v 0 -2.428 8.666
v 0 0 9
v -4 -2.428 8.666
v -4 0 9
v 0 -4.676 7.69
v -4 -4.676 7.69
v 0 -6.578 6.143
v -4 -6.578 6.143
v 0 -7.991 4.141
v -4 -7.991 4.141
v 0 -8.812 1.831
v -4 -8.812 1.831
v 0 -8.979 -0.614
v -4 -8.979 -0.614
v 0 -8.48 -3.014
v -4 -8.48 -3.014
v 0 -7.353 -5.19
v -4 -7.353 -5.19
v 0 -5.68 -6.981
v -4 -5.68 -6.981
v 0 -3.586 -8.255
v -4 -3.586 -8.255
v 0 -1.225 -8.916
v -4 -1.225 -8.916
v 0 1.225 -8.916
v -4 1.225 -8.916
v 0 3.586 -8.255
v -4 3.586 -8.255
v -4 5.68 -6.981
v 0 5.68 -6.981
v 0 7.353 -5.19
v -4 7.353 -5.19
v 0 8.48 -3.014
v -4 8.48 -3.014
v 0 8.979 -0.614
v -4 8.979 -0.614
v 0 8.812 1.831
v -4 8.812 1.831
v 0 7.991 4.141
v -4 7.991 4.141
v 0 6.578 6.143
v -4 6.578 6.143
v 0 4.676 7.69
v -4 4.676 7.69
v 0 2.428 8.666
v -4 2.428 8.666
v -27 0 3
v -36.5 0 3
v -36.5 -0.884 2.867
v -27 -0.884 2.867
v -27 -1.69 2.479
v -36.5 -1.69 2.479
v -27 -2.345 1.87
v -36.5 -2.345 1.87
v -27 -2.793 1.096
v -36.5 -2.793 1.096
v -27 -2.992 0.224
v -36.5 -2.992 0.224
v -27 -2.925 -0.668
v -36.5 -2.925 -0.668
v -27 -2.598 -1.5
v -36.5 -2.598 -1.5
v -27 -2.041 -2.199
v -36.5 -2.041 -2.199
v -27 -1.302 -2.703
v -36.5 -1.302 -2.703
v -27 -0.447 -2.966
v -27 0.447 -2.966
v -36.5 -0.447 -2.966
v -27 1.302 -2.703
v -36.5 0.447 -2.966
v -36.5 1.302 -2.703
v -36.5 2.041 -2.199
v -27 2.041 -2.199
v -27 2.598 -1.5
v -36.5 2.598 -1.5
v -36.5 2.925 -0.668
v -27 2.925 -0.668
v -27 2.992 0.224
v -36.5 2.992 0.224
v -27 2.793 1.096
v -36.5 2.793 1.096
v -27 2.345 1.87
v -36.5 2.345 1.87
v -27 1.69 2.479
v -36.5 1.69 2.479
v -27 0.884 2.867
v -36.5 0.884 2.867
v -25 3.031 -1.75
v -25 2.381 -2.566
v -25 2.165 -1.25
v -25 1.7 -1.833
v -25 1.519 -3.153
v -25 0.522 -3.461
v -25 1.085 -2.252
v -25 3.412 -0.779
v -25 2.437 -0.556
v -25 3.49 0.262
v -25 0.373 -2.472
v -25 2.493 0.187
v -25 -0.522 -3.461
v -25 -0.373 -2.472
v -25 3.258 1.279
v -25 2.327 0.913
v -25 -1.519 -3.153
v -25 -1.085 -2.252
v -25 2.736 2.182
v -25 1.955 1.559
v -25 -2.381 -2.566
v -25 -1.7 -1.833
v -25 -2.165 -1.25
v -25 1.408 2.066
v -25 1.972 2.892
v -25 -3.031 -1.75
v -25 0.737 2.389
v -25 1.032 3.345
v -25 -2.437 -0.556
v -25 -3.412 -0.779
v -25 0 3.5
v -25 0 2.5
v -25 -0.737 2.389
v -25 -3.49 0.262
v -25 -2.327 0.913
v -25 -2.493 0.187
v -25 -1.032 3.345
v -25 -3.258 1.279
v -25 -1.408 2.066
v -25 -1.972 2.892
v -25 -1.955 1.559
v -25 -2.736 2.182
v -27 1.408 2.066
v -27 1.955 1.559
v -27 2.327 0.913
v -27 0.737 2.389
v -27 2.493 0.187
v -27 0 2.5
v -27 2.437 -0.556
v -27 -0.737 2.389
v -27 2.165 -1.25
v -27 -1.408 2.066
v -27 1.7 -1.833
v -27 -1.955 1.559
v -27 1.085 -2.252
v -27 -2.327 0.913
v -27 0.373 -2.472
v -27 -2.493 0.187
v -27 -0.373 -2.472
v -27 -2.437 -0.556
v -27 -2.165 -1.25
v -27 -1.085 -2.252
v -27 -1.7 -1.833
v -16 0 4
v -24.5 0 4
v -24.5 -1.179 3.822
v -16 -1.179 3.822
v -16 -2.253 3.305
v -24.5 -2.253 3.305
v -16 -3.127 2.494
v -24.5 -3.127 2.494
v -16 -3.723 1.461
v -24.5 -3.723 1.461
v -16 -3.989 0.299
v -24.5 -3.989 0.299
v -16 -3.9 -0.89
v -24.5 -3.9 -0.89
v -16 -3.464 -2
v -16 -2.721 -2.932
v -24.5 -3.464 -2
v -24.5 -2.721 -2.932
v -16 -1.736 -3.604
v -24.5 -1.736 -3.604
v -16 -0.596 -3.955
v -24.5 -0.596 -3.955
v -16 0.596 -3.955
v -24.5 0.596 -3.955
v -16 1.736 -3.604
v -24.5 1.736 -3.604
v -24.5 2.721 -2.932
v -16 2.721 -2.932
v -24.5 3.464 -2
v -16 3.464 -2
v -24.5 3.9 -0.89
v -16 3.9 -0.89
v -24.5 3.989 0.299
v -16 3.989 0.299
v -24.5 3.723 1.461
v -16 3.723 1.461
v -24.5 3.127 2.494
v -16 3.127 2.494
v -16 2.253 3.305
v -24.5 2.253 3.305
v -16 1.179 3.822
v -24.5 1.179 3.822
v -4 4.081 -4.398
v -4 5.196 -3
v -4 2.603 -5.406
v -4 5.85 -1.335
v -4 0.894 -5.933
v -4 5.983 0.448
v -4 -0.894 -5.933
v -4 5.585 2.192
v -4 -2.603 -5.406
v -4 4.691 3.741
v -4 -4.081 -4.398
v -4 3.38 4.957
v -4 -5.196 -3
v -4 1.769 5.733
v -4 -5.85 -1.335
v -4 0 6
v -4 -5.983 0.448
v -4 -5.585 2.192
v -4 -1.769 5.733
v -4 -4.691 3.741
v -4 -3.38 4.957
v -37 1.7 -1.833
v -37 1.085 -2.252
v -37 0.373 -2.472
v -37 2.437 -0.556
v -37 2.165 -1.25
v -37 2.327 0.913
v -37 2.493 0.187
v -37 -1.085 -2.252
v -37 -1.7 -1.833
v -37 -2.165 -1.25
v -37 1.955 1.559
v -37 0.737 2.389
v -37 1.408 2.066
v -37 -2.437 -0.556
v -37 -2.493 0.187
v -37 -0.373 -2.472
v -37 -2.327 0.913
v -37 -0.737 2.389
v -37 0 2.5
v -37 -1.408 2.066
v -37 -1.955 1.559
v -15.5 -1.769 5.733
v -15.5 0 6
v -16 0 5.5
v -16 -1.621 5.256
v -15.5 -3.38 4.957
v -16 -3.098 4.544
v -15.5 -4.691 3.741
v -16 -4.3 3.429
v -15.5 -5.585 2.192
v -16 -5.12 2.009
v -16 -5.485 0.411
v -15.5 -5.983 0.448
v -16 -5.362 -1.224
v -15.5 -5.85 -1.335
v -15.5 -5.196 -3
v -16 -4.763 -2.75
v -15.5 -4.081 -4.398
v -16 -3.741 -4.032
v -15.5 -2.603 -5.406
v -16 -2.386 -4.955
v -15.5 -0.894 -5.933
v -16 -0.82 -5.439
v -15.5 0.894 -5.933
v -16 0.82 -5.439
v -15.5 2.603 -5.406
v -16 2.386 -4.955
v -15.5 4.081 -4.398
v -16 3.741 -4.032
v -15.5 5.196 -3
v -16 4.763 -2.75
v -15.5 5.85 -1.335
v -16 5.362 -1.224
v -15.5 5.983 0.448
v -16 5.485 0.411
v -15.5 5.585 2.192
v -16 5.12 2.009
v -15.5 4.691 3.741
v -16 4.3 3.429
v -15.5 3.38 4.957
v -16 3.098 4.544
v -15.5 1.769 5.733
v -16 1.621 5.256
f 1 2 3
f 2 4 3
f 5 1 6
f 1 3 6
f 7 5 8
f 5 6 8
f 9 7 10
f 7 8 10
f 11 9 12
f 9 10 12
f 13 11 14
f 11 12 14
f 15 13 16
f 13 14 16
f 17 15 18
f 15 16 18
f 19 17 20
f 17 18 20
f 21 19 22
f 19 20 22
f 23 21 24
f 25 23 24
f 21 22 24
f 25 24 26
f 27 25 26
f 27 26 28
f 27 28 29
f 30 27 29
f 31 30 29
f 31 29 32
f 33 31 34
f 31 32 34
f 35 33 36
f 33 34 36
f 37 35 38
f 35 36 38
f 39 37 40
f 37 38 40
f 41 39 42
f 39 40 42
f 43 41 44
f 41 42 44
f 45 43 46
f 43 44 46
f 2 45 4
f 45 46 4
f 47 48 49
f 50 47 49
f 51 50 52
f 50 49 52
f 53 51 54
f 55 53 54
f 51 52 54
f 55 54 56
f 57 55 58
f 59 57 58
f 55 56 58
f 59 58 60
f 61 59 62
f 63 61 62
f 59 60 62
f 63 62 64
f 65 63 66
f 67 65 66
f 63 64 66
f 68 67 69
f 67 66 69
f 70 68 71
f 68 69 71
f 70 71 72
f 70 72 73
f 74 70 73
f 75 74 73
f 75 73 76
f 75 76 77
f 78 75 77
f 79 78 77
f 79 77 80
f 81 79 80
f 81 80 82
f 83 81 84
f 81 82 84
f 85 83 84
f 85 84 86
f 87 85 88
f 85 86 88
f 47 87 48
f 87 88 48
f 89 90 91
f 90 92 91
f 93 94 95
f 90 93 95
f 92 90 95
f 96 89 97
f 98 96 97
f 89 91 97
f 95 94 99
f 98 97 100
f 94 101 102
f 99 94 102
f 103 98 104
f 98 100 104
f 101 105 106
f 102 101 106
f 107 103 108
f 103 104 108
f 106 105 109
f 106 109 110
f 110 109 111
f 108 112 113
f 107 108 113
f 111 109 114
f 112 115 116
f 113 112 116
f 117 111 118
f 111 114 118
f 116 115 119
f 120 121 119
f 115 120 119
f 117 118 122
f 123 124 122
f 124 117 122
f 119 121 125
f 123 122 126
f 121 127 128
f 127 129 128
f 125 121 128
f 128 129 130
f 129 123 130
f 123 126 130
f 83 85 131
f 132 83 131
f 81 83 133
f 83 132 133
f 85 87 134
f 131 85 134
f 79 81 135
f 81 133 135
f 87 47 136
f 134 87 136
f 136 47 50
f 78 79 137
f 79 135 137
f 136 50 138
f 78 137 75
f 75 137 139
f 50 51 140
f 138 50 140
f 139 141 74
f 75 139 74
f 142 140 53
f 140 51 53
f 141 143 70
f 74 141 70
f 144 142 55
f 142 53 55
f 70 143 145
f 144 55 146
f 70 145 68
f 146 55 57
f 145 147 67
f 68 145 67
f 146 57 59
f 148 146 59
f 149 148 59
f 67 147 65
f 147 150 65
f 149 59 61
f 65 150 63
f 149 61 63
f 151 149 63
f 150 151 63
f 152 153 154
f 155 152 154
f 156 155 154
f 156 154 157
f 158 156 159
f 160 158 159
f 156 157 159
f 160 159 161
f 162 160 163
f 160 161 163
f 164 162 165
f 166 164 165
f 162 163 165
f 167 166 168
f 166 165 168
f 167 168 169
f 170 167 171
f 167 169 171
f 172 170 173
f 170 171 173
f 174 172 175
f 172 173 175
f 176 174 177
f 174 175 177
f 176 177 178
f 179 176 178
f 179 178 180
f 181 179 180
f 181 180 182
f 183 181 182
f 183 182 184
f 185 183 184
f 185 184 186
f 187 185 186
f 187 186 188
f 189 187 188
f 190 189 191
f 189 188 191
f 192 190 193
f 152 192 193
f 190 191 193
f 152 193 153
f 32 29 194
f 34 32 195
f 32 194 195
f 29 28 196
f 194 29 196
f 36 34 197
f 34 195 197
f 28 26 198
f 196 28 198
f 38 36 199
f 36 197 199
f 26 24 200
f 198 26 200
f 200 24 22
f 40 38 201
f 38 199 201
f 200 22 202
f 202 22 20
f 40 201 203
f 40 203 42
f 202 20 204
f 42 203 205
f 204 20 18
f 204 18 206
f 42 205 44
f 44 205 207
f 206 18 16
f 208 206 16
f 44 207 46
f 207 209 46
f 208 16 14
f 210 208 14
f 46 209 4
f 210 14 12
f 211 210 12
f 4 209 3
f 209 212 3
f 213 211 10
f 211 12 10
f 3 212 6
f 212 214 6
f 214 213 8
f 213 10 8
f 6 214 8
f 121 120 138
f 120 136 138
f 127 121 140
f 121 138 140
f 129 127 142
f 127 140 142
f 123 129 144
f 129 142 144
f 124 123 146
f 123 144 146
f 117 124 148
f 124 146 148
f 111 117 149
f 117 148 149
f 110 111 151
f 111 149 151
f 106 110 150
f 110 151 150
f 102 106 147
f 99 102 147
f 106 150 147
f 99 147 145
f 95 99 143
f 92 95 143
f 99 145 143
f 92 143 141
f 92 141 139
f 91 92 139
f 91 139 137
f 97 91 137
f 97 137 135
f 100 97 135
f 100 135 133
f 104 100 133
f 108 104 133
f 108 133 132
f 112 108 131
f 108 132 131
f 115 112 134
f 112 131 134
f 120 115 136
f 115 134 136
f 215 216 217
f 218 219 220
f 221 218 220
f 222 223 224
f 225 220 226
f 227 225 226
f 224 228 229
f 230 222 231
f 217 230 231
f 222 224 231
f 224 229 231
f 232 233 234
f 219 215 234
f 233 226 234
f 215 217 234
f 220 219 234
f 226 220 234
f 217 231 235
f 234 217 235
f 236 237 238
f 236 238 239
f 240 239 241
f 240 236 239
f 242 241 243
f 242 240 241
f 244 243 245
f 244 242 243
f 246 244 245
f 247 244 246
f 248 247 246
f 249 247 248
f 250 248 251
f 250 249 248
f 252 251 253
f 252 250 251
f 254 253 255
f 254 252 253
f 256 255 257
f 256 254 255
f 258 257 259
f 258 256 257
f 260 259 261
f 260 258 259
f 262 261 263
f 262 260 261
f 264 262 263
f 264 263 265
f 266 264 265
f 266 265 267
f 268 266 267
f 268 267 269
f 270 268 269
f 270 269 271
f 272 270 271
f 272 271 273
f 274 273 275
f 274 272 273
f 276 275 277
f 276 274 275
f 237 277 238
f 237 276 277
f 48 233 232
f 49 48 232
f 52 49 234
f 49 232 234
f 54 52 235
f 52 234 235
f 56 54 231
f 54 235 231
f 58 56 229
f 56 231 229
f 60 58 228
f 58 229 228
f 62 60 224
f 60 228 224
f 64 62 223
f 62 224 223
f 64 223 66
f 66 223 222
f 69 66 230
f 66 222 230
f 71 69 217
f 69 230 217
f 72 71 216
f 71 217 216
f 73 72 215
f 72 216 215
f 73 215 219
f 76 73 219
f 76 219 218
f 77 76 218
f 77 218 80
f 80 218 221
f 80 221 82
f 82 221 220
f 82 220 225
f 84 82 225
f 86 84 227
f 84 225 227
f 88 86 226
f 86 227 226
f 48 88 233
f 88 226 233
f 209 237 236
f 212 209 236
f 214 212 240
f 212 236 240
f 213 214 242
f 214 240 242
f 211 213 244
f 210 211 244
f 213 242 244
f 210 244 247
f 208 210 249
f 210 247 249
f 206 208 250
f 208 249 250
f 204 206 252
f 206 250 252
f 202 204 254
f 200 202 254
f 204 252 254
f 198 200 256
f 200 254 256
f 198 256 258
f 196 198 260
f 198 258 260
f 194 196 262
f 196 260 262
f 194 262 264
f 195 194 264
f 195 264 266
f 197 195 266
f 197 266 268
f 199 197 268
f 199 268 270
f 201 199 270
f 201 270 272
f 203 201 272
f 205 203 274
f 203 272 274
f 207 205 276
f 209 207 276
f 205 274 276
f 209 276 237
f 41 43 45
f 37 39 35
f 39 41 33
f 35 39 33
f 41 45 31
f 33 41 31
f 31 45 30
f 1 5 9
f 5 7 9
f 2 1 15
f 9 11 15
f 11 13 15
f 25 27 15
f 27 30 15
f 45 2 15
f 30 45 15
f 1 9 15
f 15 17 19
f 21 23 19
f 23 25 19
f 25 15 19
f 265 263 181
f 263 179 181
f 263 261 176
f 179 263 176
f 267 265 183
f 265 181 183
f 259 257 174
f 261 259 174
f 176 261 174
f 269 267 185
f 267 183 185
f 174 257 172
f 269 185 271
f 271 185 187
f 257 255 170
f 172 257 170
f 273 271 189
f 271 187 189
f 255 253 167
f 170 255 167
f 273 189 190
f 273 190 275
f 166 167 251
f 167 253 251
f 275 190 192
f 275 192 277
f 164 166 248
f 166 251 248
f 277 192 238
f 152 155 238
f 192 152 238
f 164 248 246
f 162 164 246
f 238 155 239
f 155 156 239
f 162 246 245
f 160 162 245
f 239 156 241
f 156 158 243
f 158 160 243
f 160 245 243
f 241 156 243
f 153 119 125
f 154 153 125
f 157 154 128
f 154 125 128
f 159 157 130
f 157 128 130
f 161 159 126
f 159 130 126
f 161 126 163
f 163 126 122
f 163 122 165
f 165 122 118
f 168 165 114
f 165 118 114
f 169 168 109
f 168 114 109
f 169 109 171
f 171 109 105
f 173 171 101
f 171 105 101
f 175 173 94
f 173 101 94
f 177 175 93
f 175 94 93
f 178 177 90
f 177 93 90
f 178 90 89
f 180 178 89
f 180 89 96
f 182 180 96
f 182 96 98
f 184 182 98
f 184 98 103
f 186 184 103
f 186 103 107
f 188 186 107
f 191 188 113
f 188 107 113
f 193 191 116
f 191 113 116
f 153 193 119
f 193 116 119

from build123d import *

# Parameters (mm, degrees)
CHANFREIN1_SIZE = 0.5
CHANFREIN2_SIZE = 0.5
CHANFREIN3_SIZE = 0.5


with BuildPart() as part:
    # Esquisse1 → Révolution1 (revolve)
    with BuildSketch(Plane.XY, mode=Mode.PRIVATE) as r_volution1_sk:
        Polygon((0, 0), (0, 9), (-4, 9), (-4, 6), (-16, 6), (-16, 4), (-25, 4), (-25, 3), (-25, 2.5), (-27, 2.5), (-27, 3), (-37, 3), (-37, 0), align=None)
    revolve(r_volution1_sk.sketch.rotate(Axis((-37, 0, 0), (1, 0, 0)), 90), axis=Axis((-37, 0, 0), (1, 0, 0)))  # turned: the seam where the file's is

    # Chanfrein1
    chanfrein1_edges = [part.edges().sort_by_distance(p)[0] for p in [
        (-37, 0, -3),
    ]]
    chamfer(chanfrein1_edges, length=CHANFREIN1_SIZE)

    # Chanfrein2
    chanfrein2_edges = [part.edges().sort_by_distance(p)[0] for p in [
        (-16, 0, -6),
    ]]
    chamfer(chanfrein2_edges, length=CHANFREIN2_SIZE)

    # Chanfrein3
    chanfrein3_edges = [part.edges().sort_by_distance(p)[0] for p in [
        (-25, 0, -4),
    ]]
    chamfer(chanfrein3_edges, length=CHANFREIN3_SIZE)


solid = part.part
